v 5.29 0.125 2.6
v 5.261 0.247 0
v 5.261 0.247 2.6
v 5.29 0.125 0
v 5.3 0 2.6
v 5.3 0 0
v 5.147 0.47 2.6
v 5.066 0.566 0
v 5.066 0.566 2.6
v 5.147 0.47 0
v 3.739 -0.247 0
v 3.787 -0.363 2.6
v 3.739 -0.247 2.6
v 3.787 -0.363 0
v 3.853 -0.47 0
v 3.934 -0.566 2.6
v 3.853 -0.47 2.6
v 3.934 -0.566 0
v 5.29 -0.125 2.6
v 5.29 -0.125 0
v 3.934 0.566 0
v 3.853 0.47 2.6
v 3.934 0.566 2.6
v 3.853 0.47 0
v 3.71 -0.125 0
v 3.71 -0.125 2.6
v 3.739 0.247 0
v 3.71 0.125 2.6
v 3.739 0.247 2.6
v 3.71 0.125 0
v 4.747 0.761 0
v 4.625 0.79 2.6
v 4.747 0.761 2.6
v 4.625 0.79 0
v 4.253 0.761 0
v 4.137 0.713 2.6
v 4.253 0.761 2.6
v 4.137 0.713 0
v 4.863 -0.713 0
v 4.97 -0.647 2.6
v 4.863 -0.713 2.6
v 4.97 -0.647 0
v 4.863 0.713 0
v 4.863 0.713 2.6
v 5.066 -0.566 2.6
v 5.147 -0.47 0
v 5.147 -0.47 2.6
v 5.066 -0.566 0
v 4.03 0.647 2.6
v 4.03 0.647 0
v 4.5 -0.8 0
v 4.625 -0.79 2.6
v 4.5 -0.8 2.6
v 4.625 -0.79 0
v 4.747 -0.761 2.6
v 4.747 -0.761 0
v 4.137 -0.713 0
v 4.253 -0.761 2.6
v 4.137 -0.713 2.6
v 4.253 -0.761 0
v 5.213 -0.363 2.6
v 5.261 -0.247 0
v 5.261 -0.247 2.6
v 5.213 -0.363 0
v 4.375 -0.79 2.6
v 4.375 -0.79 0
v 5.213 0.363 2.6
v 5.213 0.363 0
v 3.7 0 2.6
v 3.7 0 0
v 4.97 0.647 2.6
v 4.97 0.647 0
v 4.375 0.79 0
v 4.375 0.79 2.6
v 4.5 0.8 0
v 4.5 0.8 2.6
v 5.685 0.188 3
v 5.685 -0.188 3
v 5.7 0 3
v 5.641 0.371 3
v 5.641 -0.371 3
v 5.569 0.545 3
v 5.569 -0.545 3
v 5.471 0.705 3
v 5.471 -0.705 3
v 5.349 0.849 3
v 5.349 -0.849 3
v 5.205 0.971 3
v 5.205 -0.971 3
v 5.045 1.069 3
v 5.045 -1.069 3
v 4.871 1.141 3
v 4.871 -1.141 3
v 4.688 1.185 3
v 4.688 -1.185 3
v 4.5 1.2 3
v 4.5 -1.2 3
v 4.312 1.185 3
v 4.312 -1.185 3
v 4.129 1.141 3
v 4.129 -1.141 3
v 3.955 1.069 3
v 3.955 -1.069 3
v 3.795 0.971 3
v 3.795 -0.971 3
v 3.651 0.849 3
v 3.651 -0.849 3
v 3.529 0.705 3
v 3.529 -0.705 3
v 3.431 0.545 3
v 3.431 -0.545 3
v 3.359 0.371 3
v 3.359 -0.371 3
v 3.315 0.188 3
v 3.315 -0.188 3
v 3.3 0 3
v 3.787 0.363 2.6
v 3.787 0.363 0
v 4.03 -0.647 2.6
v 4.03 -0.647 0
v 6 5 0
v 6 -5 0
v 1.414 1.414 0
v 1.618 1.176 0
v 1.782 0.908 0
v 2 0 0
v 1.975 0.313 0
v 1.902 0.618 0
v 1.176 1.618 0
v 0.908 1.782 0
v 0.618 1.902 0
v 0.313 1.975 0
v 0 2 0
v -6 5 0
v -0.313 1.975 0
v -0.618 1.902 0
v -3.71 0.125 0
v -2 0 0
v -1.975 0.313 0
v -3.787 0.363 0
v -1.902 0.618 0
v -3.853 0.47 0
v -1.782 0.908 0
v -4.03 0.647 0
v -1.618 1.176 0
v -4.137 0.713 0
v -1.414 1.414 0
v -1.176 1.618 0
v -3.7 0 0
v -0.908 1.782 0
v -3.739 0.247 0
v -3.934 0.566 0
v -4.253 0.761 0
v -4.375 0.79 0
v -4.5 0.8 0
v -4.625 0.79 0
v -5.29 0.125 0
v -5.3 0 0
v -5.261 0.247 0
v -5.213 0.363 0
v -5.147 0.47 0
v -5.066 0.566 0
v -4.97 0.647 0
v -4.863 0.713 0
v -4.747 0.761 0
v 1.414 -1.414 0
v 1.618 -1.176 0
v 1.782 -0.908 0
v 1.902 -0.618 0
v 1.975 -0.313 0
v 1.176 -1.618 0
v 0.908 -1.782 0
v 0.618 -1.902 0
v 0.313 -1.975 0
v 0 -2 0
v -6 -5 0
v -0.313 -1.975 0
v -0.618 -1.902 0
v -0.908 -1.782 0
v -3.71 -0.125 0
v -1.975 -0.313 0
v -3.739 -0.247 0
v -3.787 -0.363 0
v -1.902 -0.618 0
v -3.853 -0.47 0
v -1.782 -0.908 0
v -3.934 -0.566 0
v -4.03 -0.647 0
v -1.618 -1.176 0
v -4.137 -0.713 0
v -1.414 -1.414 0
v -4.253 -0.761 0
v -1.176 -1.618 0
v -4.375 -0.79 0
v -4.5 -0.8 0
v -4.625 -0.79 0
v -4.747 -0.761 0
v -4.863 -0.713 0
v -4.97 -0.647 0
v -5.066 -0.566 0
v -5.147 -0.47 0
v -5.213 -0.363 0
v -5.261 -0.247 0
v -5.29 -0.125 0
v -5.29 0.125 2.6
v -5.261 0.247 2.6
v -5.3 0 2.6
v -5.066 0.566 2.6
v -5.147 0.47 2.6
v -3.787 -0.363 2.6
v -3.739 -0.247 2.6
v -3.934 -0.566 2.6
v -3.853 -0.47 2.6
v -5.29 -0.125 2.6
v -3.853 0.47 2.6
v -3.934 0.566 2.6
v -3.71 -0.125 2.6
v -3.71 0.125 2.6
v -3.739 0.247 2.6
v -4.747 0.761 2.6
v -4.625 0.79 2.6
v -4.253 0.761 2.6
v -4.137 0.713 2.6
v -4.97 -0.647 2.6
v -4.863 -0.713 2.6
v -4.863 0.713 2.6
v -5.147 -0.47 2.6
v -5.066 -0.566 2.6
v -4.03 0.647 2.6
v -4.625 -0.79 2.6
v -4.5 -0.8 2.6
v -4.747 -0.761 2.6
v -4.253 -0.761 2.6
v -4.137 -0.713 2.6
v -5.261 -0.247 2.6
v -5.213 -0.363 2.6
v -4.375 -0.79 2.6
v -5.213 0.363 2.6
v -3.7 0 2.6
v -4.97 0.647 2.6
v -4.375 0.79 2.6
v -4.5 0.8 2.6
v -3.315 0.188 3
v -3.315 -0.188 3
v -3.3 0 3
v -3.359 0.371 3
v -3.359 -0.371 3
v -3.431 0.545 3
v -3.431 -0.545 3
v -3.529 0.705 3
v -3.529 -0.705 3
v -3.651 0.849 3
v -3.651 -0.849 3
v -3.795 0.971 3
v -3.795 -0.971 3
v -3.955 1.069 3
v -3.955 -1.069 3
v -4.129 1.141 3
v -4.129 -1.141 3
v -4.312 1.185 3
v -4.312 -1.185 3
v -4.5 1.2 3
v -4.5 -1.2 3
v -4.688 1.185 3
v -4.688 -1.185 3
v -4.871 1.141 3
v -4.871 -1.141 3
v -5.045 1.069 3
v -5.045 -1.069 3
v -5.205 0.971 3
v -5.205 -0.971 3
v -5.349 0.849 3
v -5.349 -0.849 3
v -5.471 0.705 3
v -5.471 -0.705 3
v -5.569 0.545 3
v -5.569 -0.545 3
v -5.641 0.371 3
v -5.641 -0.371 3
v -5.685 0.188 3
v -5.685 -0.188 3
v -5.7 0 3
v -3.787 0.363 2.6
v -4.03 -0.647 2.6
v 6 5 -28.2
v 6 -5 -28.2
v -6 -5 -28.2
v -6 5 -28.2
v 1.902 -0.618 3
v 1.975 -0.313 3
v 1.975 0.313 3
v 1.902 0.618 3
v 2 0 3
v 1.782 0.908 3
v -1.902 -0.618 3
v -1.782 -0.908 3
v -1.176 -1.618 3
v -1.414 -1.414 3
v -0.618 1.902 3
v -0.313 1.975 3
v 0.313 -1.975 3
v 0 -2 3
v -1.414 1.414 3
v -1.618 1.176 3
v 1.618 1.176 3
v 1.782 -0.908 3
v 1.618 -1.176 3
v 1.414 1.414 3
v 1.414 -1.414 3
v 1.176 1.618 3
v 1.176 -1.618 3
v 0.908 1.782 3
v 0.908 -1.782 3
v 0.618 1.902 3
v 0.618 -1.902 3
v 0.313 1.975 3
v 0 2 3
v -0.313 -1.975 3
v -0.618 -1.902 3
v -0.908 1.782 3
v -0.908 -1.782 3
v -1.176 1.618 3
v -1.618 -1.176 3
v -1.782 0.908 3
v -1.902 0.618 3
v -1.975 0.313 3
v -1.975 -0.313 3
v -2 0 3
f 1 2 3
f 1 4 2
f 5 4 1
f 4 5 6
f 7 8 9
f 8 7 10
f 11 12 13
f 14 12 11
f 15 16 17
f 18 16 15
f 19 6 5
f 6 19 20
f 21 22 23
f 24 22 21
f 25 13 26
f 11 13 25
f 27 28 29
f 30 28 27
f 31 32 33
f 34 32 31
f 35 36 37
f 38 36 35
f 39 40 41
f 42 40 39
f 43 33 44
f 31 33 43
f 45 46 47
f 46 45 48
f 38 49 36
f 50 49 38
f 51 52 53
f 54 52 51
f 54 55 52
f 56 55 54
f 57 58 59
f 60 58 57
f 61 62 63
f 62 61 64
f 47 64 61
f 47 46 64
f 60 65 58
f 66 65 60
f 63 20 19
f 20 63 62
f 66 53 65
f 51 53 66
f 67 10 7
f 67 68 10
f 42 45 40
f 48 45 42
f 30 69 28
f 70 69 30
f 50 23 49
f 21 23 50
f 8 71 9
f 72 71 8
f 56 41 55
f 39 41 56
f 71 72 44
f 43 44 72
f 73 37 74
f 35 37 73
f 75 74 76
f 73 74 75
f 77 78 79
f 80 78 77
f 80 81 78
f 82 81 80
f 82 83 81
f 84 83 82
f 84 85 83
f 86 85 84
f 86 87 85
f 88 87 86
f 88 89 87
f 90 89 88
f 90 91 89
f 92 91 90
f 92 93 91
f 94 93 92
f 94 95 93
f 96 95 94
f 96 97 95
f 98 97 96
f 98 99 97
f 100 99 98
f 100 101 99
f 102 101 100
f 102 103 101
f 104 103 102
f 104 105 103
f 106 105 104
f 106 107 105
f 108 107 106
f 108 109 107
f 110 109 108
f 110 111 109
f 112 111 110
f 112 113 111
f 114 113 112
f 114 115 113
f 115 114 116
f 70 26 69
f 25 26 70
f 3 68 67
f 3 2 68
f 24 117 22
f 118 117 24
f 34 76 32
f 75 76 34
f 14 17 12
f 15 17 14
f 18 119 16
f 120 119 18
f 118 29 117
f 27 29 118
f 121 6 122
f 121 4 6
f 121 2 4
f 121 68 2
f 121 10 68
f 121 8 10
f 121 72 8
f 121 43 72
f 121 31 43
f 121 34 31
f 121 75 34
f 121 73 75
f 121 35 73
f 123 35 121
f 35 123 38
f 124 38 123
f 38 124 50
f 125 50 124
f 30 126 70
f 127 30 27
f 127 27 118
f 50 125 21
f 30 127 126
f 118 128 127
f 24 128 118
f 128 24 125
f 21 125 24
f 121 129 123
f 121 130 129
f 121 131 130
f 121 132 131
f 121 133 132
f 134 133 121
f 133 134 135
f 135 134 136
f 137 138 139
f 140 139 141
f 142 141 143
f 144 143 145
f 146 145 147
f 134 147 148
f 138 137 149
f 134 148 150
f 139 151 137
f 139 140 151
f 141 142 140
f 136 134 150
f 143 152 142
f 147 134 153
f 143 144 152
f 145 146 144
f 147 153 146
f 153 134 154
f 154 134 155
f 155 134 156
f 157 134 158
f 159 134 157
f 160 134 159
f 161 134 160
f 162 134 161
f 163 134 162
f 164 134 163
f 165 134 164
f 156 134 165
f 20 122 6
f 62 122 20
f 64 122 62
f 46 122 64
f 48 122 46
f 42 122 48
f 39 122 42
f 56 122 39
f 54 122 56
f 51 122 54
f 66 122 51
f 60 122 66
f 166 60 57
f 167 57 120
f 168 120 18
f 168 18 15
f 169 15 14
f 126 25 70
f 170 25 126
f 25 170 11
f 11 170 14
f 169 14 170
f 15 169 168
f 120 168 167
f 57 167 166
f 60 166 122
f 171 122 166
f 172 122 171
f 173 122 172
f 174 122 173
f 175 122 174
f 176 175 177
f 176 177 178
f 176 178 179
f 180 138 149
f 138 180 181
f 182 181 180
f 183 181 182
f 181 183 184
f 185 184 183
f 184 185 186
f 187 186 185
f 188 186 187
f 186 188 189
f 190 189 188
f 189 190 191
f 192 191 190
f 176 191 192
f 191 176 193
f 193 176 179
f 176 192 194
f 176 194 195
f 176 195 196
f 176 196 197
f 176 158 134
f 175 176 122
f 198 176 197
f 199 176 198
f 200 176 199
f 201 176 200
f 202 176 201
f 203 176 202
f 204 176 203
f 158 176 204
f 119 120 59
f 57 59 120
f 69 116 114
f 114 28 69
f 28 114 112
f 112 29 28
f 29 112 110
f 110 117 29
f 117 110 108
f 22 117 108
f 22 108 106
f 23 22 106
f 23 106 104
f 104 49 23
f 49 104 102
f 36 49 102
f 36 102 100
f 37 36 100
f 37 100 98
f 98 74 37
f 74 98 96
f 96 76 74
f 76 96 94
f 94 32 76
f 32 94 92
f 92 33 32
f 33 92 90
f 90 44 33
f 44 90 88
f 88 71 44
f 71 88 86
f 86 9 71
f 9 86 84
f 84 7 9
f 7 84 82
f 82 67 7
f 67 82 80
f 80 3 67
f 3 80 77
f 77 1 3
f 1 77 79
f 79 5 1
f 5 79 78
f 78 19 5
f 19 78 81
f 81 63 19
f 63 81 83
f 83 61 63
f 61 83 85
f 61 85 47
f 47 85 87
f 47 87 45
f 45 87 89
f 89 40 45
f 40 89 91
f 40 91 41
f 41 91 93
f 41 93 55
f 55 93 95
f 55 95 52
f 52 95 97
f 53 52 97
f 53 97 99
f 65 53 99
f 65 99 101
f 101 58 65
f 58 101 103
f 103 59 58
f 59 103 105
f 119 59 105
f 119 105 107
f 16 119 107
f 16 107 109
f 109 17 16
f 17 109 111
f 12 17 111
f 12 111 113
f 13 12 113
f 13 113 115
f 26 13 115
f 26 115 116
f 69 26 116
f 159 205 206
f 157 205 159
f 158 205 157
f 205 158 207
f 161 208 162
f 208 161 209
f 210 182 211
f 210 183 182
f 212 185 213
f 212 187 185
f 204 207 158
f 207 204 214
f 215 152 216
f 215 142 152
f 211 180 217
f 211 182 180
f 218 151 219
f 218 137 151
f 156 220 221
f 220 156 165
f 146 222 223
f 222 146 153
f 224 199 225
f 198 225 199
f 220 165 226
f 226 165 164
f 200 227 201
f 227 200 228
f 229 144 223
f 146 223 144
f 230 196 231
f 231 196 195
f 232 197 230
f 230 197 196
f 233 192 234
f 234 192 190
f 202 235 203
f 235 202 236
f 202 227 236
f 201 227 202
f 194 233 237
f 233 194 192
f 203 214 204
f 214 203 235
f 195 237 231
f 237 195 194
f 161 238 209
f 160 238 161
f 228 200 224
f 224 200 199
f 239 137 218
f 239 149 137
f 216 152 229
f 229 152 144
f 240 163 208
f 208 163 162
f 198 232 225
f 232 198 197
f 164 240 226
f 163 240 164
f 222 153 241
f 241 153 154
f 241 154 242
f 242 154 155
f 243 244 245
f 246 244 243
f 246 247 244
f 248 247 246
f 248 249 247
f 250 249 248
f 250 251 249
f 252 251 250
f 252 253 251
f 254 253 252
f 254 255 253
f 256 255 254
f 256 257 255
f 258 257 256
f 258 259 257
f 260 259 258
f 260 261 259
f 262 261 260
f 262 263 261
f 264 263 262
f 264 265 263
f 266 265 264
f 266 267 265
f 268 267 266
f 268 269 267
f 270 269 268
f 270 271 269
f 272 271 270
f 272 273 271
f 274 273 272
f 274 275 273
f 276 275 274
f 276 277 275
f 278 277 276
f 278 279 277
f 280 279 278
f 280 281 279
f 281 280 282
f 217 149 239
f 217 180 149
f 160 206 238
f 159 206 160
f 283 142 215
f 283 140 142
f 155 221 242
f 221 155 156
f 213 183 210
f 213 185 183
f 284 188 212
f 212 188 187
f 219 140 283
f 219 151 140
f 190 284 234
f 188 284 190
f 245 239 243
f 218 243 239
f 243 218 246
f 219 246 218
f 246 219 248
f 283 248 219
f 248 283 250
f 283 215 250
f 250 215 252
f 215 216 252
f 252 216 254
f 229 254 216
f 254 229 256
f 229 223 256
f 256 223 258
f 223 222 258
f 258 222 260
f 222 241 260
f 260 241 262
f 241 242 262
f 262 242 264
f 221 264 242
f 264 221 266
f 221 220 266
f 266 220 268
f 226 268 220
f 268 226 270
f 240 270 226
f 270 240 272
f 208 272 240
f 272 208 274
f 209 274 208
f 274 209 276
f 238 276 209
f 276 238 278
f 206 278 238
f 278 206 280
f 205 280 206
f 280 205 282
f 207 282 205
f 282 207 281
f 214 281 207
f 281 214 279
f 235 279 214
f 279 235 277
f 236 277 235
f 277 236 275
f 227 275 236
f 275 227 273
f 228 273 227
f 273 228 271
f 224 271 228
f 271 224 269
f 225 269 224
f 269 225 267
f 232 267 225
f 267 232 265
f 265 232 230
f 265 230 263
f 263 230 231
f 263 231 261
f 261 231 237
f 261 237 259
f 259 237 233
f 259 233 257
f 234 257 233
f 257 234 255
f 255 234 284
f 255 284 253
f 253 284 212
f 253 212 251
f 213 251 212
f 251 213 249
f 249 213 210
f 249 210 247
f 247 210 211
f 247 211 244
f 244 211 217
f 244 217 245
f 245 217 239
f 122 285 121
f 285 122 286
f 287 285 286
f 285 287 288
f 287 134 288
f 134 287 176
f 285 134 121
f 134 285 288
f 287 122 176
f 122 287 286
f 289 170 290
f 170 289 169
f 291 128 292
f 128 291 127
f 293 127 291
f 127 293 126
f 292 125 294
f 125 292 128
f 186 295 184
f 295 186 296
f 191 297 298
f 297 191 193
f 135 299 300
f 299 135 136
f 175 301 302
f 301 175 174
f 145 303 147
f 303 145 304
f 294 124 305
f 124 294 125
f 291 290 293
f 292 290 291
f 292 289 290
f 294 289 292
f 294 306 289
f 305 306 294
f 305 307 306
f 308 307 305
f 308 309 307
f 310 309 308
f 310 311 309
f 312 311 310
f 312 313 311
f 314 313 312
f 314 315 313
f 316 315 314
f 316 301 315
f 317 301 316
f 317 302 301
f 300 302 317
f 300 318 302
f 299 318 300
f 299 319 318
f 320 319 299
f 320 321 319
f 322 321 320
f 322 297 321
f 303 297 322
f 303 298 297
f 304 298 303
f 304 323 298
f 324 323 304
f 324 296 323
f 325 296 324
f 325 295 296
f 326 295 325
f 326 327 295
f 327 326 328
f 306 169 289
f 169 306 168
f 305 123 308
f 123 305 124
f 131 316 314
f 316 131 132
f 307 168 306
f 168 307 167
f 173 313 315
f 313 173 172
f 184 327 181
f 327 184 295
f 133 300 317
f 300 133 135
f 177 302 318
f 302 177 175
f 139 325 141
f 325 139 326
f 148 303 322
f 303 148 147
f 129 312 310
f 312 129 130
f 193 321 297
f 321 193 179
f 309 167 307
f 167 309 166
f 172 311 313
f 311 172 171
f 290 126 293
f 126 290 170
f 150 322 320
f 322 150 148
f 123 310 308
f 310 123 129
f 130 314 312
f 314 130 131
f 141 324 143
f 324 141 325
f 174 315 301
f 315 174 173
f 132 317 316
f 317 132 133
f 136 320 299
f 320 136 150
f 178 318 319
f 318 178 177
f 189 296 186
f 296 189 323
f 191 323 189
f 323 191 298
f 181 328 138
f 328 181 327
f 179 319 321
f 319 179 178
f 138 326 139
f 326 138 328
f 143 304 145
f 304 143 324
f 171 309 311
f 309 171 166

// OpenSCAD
$fn = 40;

// usefull modules

//cloning mirror
module mirror2(v) {
    children();
    mirror(v) children();
}


// hole for vertical printing (no suppurt)
module smart_hole(d = 10, h = 10, center = true, bridging = true) {
    difference() {
        union() {
            rotate([0,90,0])
                cylinder(d = d, h = h, center = center);
            translate([0,0,sqrt(2*d*d)/4])
                rotate([45,0,0])
                cube([h,d/2,d/2], center = center);
        }
        if(bridging)
            translate([0,0,d])
                cube([h+1,d,d], center = center);
    }
}

// for angled screw head 
// sh_d = screw head diameter
module smart_screw_hole(d = 3.2, h = 20, sh_d = 7, sh_h = 4, center = true, bridging = true) {
    smart_hole(d=d, h=h, center = center, bridging = bridging);
    translate([-h/2,0,])
        rotate([0,90,0])
        rotate_extrude(angle = 360)
        polygon([[d/2, sh_h],[ sh_d/2,0], [d/2,0], [d/2 - 2, 0], [d/2 - 2, sh_h]]);
}

function pulley_d_calc(teeth) = (2*((teeth*2)/(3.14159265*2)-0.254));

module pulley(teeth = 40, h = 12, sides = 0) {
    additional_tooth_width = 0.2; //mm
    additional_tooth_depth = 0.2; //mm

    
    pulley_OD = pulley_d_calc(teeth);
    tooth_depth = 0.764;
    tooth_width = 1.494;
    
	tooth_distance_from_centre = sqrt( pow(pulley_OD/2,2) - pow((tooth_width+additional_tooth_width)/2,2));
	tooth_width_scale = (tooth_width + additional_tooth_width ) / tooth_width;
	tooth_depth_scale = ((tooth_depth + additional_tooth_depth ) / tooth_depth) ;

    module GT2_2mm() {
        linear_extrude(height=h+2) polygon([[0.747183,-0.5],[0.747183,0],[0.647876,0.037218],
        [0.598311,0.130528],[0.578556,0.238423],[0.547158,0.343077],[0.504649,0.443762],[0.451556,0.53975],
        [0.358229,0.636924],[0.2484,0.707276],[0.127259,0.750044],[0,0.76447],[-0.127259,0.750044],
        [-0.2484,0.707276],[-0.358229,0.636924],[-0.451556,0.53975],[-0.504797,0.443762],[-0.547291,0.343077],
        [-0.578605,0.238423],[-0.598311,0.130528],[-0.648009,0.037218],[-0.747183,0],[-0.747183,-0.5]]);
    }   

	difference() {	
		rotate ([0,0,360/(teeth*4)]) 
		cylinder(r=pulley_OD/2,h=h, $fn=teeth*4);
	
		//teeth - cut out of shaft
		
		for(i=[1:teeth]) 
        rotate([0,0,i*(360/teeth)]) 
        translate([0,-tooth_distance_from_centre,-1]) 
        scale ([ tooth_width_scale , tooth_depth_scale , 1 ]) 
        {
         GT2_2mm();
        }
	}	
    if ( sides > 0 ) {
        translate ([0,0, h - sides]) 
        rotate_extrude($fn=teeth*4)  
        polygon([[0,0],[pulley_OD/2,0],[pulley_OD/2 + sides , sides],[0 , sides],[0,0]]);
    }
		
    if ( sides > 0 ) {
        translate ([0,0,0 ]) 
        rotate_extrude($fn=teeth*4)  
        polygon([[0,0],[pulley_OD/2 + sides,0],[pulley_OD/2 , sides],[0 , sides],[0,0]]);
    } 
}

module belt_connector_round(teeth = 40, h = 8, belt_thick = 1, wall_thick = 5, wall_ang = 90, outer_d = 40) {
    pulley(teeth = 40, h = 8);
    
    wall_inner_r = pulley_d_calc(teeth) / 2 + belt_thick;
    
    if(outer_d / 2 - wall_inner_r > wall_thick) 
    {  
        echo("here");
        wall_center_r = (pulley_d_calc(teeth) + outer_d / 2 - wall_inner_r) / 2 + belt_thick;
        
        rotate_extrude(angle = wall_ang)
        translate([wall_center_r,h / 2,0])
        square([outer_d / 2 - wall_inner_r, h], center = true);
    } else {  
        wall_center_r = (pulley_d_calc(teeth) + wall_thick) / 2 + belt_thick;
        
        rotate_extrude(angle = wall_ang)
        translate([wall_center_r,h / 2,0])
        square([wall_thick, h], center = true);
    }
}

module motor_s_cutout(screw_l = 3) {
	//todo get dimension
	motor_w = 12;
	motor_d = 10;
	gear_h = 8; // get real
	motor_h = 15.2 + gear_h + 5;

	shaft_d = 4;
	shaft_l = screw_l;
	
	//ssrews
	screws_cnt = 2;
	screw_offset = 9 / 2;  
	screw_d = 1.6;
	screw_top_d = 2.4;
	screw_top_off = (screw_d - screw_top_d) / 2;

	translate([0, 0, - motor_h / 2])
		cube([motor_w, motor_d, motor_h], center = true);
	translate([0, 0, + shaft_l / 2])
		cylinder(d = shaft_d, h = shaft_l, center = true);
	mirror2([1,0,0])
		translate([screw_offset, 0, + screw_l / 2]) {
			cylinder(d = screw_d, h = screw_l, center = true);

			rotate_extrude()
				polygon([[screw_d / 2	 , screw_l / 2],
						 [screw_top_d / 2, screw_l / 2],
						 [screw_d / 2	 , screw_l / 2 + screw_top_off]]);
			}
}

motor_s_cutout();

module motor_m_cutout() {

}

module motor_l_cutout() {

}

/*
difference() {
    union() {
        pulley(teeth = 20, h = 10, sides = 2);
        translate([0,0,-3])
            cylinder(h = 6, d = pulley_d_calc(20) + 4, center = true, $fn = 20 * 4);
        translate([0,0,10.5])
            cylinder(h = 1, d = pulley_d_calc(20) + 4, center = true, $fn = 20 * 4);
    }
    
    cylinder(d = 4.5, h = 30, center = true);
    translate([0, 4.2, -3])
        cube([6, 3, 7], center = true);
    translate([0, 10, -3])
        rotate([90,00,0])
            cylinder(h = 20, d = 3.2, center = true);
}
*/

/*translate([0, 0, 0])
    cube([40,40,5], center = true);
rotate([0,0,135])
    belt_connector_round();
*/
/*
difference() {
    union() {
        translate([-200/2, 0, -2.5])
            cube([200,30,5], center = true);
        translate([0,0,-2.5])
            cylinder(h = 5, d = 30, center = true);
        translate([-200,0,-2.5])
            cylinder(h = 5, d = 30, center = true);
        rotate([0,0,135])
            belt_connector_round();
    }
   
    cylinder(h = 20, d = 8, center = true);
    translate([-50, 0, -2.5])
        cylinder(h = 20, d = 8, center = true);
    translate([-100, 0, -2.5])
        cylinder(h = 20, d = 8, center = true);
    translate([-150, 0, -2.5])
        cylinder(h = 20, d = 8, center = true);
    translate([-200, 0, -2.5])
        cylinder(h = 20, d = 8, center = true);
}*/
/*
//smart_hole();
difference() {
    cube([30,60,60], center = true);
    smart_screw_hole(d = 30, h = 30, sh_d = 40, sh_h = 5);
    
}*/
